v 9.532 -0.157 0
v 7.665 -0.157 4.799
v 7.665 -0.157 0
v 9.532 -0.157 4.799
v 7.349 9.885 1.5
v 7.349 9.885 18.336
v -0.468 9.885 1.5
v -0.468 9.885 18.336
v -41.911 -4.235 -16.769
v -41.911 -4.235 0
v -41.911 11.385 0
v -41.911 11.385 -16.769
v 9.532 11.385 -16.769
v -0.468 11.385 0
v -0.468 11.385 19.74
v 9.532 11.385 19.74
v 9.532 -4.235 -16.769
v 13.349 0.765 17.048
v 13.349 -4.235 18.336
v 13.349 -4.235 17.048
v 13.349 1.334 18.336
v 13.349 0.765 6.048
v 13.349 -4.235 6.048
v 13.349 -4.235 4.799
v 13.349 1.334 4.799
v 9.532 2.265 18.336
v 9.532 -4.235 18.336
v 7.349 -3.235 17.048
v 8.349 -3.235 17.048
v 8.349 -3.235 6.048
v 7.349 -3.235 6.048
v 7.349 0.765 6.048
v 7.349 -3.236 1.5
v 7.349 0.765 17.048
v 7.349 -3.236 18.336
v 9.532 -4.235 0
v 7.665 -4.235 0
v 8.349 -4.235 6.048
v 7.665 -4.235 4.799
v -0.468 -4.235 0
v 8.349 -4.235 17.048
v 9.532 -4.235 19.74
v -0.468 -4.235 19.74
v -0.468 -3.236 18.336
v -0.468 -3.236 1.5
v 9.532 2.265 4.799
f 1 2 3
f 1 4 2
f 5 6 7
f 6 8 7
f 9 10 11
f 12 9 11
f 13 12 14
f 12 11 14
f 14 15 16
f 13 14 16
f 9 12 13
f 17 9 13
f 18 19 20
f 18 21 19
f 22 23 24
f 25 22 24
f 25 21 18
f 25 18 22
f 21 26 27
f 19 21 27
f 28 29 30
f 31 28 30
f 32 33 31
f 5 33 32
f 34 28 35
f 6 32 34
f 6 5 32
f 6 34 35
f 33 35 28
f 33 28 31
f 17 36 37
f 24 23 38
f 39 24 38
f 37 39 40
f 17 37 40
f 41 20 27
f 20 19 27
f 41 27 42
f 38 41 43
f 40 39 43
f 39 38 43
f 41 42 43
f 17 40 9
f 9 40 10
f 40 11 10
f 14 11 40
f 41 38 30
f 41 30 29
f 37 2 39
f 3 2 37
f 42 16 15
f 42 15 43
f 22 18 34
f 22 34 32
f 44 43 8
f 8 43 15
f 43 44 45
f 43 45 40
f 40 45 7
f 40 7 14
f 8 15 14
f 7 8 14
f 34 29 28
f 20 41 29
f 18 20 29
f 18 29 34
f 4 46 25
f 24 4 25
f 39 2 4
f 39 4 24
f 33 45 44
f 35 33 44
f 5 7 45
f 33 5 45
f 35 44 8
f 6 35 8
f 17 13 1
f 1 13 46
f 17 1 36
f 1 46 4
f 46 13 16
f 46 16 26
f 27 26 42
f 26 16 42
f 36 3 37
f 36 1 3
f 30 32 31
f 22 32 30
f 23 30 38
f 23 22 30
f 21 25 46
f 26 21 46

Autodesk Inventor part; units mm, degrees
ref_plane "YZ Plane" through (0, 0, 0) normal (1, 0, 0) x (0, 1, 0)
ref_plane "XZ Plane" through (0, 0, 0) normal (0, 1, 0) x (-1, 0, 0)
ref_plane "XY Plane" through (0, 0, 0) normal (0, 0, 1) x (1, 0, 0)
sketch "Эскиз1" plane through (0, 0, 0) normal (0, 0, 1) x (1, 0, 0)
  line L0 (-41.9106, 11.3854) -> (9.5324, 11.3854)
  line L1 (9.5324, 11.3854) -> (9.5324, -4.2346)
  line L2 (9.5324, -4.2346) -> (-41.9106, -4.2346)
  line L3 (-41.9106, -4.2346) -> (-41.9106, 11.3854)
  point P0 (0, 0)
  dimension "d0" = 51.443
  dimension "d1" = 15.62
extrude "Выдавливание1" add sketch "Эскиз1" against normal blind 16.769
sketch "Эскиз2" plane through (9.5324, -4.2346, 0) normal (1, 0, 0) x (0, 0, -1)
  line L0 (0, 15.62) -> (16.769, 15.62) projected
  line L1 (16.769, 15.62) -> (-19.74, 15.62)
  line L2 (-19.74, 15.62) -> (-19.74, 0)
  line L3 (-19.74, 0) -> (16.769, 0)
  line L4 (16.769, 0) -> (16.769, 15.62)
  point P0 (0, 4.2346)
  dimension "d4" = 36.509
extrude "Выдавливание2" add sketch "Эскиз2" against normal blind 10
sketch "Эскиз3" plane through (9.5324, -4.2346, -16.769) normal (1, 0, 0) x (0, 0, -1)
  line L0 (0, 15.62) -> (0, 0) projected
  line L1 (-36.509, 0) -> (0, 0) projected
  line L2 (-16.769, 0) -> (-21.568, 0)
  line L3 (-21.568, 0) -> (-21.568, 4.078)
  line L4 (-21.568, 4.078) -> (-16.769, 4.078)
  line L5 (-16.769, 4.078) -> (-16.769, 0)
  point P0 (-16.769, 4.2346)
  dimension "d7" = 16.769
  dimension "d8" = 4.799
  dimension "d9" = 4.078
extrude "Выдавливание3" cut sketch "Эскиз3" against normal blind 1.867
sketch "Эскиз4" plane through (-0.4676, -4.2346, 0) normal (-1, 0, 0) x (0, 0, 1)
  line L0 (19.74, 15.62) -> (19.74, 0) projected
  line L1 (18.24, 1.5) -> (1.5, 1.5)
  line L2 (1.5, 1.5) -> (1.5, 14.12)
  line L3 (1.5, 14.12) -> (18.24, 14.12)
  line L4 (18.24, 14.12) -> (18.24, 1.5)
  point P0 (0, 4.2346)
extrude "Выдавливание4" cut sketch "Эскиз4" against normal blind 7.5
sketch "Эскиз6" plane through (9.5324, -4.2346, -16.769) normal (1, 0, 0) x (0, 0, -1)
  line L0 (-16.769, 0) -> (-36.509, 0) projected
  line L1 (-21.817, 0) -> (-22.817, 0)
  line L2 (-33.817, 5) -> (-22.817, 5)
  line L3 (-28.317, 6.7654) -> (-28.317, -1.5681)
  line L4 (-36.509, 0) -> (-21.568, 0) projected
  line L5 (-33.817, 5) -> (-33.817, 0)
  line L6 (-22.817, 5) -> (-22.817, 0)
  line L7 (-35.1049, 6.5) -> (-35.1049, 0)
  line L8 (-35.1049, 0) -> (-33.817, 0)
  line L9 (-35.1049, 6.5) -> (-21.568, 6.5)
  line L10 (-21.568, 6.5) -> (-21.568, 0)
  line L11 (-21.568, 0) -> (-21.568, 4.078) projected
  line L12 (-21.568, 0) -> (-22.817, 0)
  point P0 (-16.769, 4.2346)
  dimension "d20" = 1
  dimension "d27" = 5
extrude "Выдавливание6" add sketch "Эскиз6" along normal blind 3.817 contours L0 L6 L2 L3 L9 L10 | L3 L2 L5 L0 L7 L9
sketch "Эскиз7" plane through (9.5324, -0.1566, 4.799) normal (0, 0, -1) x (-1, 0, 0)
  line L0 (-3.817, 1.491) -> (0, 2.422)
  line L1 (0, 11.542) -> (0, -4.078) projected
  line L2 (0, 2.422) -> (-3.817, 2.422) projected
  line L3 (0, 2.422) -> (-3.817, 2.422)
  line L4 (-3.817, 2.422) -> (-3.817, 1.491)
  point P0 (9.5324, 0.1566)
  point P1 (-3.817, -4.078)
extrude "Выдавливание7" cut sketch "Эскиз7" against normal blind 13.54
sketch "Эскиз8" plane through (-41.9106, -4.2346, -16.769) normal (0, -1, 0) x (1, 0, 0)
  line L0 (51.443, 33.817) -> (55.26, 33.817) projected
  line L1 (55.26, 33.817) -> (50.26, 33.817)
  line L2 (55.26, 33.817) -> (55.26, 22.817) projected
  line L3 (55.26, 22.817) -> (50.26, 22.817)
  line L4 (50.26, 22.817) -> (50.26, 33.817)
  line L5 (55.26, 22.817) -> (55.26, 33.817)
  point P0 (41.9106, 16.769)
  dimension "d33" = 5
  dimension "d34" = 5
extrude "Выдавливание8" cut sketch "Эскиз8" against normal blind 5
sketch "Эскиз10" plane through (8.3494, -4.2346, 17.048) normal (1, 0, 0) x (0, 0, -1)
  line L0 (0, 0) -> (0, 5) projected
  line L1 (0, 5) -> (0, 1)
  line L2 (0, 1) -> (11, 1)
  line L3 (11, 5) -> (11, 0) projected
  line L4 (11, 1) -> (11, 5)
  line L5 (0, 5) -> (11, 5) projected
  line L6 (11, 5) -> (0, 5)
  point P0 (17.048, 4.2346)
  dimension "d38" = 4
extrude "Выдавливание9" cut sketch "Эскиз10" against normal blind 10
sketch "Эскиз11" plane through (-0.4676, -4.2346, 0) normal (-1, 0, 0) x (0, 0, 1)
  line L0 (17.048, 0) -> (17.048, 5) projected
  line L1 (18.3359, 5.569) -> (18.3359, 0) projected
  line L2 (18.3359, 0.9988) -> (18.3359, 14.12)
  line L3 (1.5, 14.12) -> (18.24, 14.12) projected
  line L4 (18.3359, 14.12) -> (1.5, 14.12)
  line L5 (1.5, 14.12) -> (1.5, 0.9988)
  line L6 (1.5, 1.5) -> (1.5, 14.12) projected
  line L7 (1.5, 0.9988) -> (18.3359, 0.9988)
  point P0 (0, 4.2346)
extrude "Выдавливание10" cut sketch "Эскиз11" against normal blind 7.817
properties part number "Батарейка"
